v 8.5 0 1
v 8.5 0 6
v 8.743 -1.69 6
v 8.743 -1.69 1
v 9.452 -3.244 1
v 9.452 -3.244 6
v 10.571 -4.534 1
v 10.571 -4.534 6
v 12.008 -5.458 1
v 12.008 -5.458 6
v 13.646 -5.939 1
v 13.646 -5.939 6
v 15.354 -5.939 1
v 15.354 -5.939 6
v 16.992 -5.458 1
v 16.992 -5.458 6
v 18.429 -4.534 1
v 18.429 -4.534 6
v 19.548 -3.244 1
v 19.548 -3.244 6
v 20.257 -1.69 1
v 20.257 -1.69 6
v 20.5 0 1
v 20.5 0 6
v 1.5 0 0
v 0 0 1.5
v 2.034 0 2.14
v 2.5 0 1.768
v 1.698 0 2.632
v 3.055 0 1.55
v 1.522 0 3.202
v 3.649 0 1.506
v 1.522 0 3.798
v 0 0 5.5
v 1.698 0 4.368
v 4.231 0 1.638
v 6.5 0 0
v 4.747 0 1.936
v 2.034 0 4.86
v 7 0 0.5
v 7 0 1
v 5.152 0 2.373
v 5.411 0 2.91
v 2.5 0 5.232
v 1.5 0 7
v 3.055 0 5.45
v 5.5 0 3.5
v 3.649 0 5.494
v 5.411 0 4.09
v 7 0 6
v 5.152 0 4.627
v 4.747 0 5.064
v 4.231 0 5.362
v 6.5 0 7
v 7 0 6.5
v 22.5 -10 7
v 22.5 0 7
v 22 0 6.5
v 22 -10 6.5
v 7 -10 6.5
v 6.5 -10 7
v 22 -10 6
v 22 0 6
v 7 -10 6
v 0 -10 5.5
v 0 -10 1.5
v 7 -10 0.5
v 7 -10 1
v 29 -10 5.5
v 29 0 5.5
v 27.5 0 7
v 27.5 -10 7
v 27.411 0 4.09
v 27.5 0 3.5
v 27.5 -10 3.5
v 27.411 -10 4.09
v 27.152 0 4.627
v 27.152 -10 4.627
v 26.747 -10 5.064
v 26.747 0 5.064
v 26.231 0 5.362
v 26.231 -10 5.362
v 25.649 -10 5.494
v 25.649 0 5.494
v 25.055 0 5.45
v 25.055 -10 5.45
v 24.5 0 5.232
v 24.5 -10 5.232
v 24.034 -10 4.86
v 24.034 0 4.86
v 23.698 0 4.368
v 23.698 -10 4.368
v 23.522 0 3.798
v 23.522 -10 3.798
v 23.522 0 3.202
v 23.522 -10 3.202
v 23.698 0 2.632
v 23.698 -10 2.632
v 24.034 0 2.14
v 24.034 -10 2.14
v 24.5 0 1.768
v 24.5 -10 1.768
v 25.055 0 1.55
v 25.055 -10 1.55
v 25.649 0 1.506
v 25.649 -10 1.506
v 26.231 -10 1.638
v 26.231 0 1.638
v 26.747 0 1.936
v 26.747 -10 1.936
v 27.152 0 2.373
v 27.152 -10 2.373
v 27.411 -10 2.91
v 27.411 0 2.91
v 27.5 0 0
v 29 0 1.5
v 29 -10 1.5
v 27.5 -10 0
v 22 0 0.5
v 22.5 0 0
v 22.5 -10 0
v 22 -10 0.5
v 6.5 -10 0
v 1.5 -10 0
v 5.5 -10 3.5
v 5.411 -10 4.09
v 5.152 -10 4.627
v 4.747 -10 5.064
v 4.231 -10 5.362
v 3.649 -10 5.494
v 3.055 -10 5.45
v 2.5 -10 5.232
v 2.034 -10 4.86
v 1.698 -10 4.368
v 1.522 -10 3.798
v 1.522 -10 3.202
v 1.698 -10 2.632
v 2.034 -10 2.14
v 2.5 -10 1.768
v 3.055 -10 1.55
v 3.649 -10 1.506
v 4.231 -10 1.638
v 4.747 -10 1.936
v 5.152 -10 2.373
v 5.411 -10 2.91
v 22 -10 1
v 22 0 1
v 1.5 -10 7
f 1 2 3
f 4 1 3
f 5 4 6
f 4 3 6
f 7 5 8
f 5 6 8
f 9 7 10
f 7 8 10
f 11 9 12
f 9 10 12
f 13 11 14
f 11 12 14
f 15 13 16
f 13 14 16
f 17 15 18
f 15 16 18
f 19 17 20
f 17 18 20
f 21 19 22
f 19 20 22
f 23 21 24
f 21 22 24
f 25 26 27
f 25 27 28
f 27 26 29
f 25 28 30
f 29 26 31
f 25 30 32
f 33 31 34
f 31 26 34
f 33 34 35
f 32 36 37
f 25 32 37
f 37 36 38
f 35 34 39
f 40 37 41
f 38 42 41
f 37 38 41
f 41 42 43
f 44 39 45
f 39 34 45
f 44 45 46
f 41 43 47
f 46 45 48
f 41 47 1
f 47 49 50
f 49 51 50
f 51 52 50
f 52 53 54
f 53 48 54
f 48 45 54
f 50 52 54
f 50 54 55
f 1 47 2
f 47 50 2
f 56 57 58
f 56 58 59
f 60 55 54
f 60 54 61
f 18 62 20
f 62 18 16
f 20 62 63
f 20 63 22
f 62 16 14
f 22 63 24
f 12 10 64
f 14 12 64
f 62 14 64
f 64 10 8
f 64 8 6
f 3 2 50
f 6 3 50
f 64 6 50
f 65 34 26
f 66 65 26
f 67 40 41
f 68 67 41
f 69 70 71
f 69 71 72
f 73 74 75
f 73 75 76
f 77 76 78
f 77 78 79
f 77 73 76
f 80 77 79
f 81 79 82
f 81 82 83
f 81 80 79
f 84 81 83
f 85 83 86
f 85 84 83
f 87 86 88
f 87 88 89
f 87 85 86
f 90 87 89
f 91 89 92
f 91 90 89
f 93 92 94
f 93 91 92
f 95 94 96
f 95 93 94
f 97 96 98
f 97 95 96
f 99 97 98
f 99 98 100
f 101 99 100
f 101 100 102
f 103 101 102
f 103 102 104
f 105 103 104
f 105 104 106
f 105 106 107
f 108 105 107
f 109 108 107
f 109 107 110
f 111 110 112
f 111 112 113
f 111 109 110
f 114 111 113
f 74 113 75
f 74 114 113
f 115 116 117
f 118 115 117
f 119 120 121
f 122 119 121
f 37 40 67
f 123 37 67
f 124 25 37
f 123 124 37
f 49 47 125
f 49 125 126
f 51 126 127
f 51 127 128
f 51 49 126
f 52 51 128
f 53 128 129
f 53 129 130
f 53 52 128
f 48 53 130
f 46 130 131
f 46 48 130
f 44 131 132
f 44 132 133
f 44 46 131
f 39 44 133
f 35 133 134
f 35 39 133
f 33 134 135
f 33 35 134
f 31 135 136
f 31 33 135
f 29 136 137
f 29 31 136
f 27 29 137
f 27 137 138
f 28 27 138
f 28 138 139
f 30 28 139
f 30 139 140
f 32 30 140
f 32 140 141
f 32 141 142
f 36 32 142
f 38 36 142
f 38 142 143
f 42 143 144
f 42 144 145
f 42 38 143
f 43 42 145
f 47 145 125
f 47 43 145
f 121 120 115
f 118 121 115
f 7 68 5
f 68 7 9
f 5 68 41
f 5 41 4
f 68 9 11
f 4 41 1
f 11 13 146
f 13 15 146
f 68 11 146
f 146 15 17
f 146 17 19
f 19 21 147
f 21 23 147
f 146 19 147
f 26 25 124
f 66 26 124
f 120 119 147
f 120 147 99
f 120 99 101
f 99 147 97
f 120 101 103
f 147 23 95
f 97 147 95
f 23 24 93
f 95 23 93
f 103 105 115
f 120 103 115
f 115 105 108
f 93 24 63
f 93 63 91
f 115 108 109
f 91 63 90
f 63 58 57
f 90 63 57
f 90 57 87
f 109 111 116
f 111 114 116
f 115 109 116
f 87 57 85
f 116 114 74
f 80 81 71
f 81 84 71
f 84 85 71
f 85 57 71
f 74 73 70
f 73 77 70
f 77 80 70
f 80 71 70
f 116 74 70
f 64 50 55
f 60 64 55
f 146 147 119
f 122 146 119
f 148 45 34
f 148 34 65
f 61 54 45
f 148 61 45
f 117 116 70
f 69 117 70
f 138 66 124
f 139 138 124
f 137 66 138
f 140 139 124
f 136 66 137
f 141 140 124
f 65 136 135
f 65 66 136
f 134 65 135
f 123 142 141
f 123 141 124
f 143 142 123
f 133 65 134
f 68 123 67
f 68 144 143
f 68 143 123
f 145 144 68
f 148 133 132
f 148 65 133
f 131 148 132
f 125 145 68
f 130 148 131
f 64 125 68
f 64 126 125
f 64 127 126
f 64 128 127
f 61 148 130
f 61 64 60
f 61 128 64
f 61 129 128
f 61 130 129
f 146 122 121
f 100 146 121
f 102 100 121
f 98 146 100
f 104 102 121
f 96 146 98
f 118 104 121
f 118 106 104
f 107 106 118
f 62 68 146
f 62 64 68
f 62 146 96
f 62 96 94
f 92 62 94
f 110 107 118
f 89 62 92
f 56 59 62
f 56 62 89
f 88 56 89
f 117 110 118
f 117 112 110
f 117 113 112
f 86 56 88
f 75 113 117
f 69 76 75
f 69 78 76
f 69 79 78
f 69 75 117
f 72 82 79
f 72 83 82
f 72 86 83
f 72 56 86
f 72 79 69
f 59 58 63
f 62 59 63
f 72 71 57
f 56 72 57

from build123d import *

# Parameters (mm, degrees)
SKETCH_R        = 2
PAD_DEPTH       = 10
POCKET_DEPTH    = 6.001
CHAMFER_SIZE    = 1.5
CHAMFER001_SIZE = 0.5


with BuildPart() as part:
    # Sketch → Pad (new body)
    with BuildSketch(Plane.XZ):
        Polygon((0, 7), (0, 0), (7, 0), (7, 1), (22, 1), (22, 0), (29, 0), (29, 7), (22, 7), (22, 6), (7, 6), (7, 7), align=None)
        with Locations((3.5, 3.5)):
            Circle(SKETCH_R, mode=Mode.SUBTRACT)
        with Locations((25.5, 3.5)):
            Circle(SKETCH_R, mode=Mode.SUBTRACT)
    extrude(amount=PAD_DEPTH)

    # Sketch001 (on Face10 of Pad) → Pocket (cut, through all)
    with BuildSketch(Plane(origin=(0, 0, 6), x_dir=(-1, 0, 0), z_dir=(0, 0, 1))):
        with BuildLine():
            ThreePointArc((-8.5, 0), (-14.5, 6), (-20.5, 0))
            Line((-20.5, 0), (-8.5, 0))
        make_face()
    extrude(amount=-POCKET_DEPTH, mode=Mode.SUBTRACT)

    # Chamfer
    chamfer_edges = [part.edges().sort_by_distance(p)[0] for p in [
        (0, -5, 0),
        (0, -5, 7),
        (29, -5, 0),
        (29, -5, 7),
    ]]
    chamfer(chamfer_edges, length=CHAMFER_SIZE)

    # Chamfer001
    chamfer001_edges = [part.edges().sort_by_distance(p)[0] for p in [
        (7, -5, 7),
        (22, -5, 7),
        (7, -5, 0),
        (22, -5, 0),
    ]]
    chamfer(chamfer001_edges, length=CHAMFER001_SIZE)


solid = part.part
